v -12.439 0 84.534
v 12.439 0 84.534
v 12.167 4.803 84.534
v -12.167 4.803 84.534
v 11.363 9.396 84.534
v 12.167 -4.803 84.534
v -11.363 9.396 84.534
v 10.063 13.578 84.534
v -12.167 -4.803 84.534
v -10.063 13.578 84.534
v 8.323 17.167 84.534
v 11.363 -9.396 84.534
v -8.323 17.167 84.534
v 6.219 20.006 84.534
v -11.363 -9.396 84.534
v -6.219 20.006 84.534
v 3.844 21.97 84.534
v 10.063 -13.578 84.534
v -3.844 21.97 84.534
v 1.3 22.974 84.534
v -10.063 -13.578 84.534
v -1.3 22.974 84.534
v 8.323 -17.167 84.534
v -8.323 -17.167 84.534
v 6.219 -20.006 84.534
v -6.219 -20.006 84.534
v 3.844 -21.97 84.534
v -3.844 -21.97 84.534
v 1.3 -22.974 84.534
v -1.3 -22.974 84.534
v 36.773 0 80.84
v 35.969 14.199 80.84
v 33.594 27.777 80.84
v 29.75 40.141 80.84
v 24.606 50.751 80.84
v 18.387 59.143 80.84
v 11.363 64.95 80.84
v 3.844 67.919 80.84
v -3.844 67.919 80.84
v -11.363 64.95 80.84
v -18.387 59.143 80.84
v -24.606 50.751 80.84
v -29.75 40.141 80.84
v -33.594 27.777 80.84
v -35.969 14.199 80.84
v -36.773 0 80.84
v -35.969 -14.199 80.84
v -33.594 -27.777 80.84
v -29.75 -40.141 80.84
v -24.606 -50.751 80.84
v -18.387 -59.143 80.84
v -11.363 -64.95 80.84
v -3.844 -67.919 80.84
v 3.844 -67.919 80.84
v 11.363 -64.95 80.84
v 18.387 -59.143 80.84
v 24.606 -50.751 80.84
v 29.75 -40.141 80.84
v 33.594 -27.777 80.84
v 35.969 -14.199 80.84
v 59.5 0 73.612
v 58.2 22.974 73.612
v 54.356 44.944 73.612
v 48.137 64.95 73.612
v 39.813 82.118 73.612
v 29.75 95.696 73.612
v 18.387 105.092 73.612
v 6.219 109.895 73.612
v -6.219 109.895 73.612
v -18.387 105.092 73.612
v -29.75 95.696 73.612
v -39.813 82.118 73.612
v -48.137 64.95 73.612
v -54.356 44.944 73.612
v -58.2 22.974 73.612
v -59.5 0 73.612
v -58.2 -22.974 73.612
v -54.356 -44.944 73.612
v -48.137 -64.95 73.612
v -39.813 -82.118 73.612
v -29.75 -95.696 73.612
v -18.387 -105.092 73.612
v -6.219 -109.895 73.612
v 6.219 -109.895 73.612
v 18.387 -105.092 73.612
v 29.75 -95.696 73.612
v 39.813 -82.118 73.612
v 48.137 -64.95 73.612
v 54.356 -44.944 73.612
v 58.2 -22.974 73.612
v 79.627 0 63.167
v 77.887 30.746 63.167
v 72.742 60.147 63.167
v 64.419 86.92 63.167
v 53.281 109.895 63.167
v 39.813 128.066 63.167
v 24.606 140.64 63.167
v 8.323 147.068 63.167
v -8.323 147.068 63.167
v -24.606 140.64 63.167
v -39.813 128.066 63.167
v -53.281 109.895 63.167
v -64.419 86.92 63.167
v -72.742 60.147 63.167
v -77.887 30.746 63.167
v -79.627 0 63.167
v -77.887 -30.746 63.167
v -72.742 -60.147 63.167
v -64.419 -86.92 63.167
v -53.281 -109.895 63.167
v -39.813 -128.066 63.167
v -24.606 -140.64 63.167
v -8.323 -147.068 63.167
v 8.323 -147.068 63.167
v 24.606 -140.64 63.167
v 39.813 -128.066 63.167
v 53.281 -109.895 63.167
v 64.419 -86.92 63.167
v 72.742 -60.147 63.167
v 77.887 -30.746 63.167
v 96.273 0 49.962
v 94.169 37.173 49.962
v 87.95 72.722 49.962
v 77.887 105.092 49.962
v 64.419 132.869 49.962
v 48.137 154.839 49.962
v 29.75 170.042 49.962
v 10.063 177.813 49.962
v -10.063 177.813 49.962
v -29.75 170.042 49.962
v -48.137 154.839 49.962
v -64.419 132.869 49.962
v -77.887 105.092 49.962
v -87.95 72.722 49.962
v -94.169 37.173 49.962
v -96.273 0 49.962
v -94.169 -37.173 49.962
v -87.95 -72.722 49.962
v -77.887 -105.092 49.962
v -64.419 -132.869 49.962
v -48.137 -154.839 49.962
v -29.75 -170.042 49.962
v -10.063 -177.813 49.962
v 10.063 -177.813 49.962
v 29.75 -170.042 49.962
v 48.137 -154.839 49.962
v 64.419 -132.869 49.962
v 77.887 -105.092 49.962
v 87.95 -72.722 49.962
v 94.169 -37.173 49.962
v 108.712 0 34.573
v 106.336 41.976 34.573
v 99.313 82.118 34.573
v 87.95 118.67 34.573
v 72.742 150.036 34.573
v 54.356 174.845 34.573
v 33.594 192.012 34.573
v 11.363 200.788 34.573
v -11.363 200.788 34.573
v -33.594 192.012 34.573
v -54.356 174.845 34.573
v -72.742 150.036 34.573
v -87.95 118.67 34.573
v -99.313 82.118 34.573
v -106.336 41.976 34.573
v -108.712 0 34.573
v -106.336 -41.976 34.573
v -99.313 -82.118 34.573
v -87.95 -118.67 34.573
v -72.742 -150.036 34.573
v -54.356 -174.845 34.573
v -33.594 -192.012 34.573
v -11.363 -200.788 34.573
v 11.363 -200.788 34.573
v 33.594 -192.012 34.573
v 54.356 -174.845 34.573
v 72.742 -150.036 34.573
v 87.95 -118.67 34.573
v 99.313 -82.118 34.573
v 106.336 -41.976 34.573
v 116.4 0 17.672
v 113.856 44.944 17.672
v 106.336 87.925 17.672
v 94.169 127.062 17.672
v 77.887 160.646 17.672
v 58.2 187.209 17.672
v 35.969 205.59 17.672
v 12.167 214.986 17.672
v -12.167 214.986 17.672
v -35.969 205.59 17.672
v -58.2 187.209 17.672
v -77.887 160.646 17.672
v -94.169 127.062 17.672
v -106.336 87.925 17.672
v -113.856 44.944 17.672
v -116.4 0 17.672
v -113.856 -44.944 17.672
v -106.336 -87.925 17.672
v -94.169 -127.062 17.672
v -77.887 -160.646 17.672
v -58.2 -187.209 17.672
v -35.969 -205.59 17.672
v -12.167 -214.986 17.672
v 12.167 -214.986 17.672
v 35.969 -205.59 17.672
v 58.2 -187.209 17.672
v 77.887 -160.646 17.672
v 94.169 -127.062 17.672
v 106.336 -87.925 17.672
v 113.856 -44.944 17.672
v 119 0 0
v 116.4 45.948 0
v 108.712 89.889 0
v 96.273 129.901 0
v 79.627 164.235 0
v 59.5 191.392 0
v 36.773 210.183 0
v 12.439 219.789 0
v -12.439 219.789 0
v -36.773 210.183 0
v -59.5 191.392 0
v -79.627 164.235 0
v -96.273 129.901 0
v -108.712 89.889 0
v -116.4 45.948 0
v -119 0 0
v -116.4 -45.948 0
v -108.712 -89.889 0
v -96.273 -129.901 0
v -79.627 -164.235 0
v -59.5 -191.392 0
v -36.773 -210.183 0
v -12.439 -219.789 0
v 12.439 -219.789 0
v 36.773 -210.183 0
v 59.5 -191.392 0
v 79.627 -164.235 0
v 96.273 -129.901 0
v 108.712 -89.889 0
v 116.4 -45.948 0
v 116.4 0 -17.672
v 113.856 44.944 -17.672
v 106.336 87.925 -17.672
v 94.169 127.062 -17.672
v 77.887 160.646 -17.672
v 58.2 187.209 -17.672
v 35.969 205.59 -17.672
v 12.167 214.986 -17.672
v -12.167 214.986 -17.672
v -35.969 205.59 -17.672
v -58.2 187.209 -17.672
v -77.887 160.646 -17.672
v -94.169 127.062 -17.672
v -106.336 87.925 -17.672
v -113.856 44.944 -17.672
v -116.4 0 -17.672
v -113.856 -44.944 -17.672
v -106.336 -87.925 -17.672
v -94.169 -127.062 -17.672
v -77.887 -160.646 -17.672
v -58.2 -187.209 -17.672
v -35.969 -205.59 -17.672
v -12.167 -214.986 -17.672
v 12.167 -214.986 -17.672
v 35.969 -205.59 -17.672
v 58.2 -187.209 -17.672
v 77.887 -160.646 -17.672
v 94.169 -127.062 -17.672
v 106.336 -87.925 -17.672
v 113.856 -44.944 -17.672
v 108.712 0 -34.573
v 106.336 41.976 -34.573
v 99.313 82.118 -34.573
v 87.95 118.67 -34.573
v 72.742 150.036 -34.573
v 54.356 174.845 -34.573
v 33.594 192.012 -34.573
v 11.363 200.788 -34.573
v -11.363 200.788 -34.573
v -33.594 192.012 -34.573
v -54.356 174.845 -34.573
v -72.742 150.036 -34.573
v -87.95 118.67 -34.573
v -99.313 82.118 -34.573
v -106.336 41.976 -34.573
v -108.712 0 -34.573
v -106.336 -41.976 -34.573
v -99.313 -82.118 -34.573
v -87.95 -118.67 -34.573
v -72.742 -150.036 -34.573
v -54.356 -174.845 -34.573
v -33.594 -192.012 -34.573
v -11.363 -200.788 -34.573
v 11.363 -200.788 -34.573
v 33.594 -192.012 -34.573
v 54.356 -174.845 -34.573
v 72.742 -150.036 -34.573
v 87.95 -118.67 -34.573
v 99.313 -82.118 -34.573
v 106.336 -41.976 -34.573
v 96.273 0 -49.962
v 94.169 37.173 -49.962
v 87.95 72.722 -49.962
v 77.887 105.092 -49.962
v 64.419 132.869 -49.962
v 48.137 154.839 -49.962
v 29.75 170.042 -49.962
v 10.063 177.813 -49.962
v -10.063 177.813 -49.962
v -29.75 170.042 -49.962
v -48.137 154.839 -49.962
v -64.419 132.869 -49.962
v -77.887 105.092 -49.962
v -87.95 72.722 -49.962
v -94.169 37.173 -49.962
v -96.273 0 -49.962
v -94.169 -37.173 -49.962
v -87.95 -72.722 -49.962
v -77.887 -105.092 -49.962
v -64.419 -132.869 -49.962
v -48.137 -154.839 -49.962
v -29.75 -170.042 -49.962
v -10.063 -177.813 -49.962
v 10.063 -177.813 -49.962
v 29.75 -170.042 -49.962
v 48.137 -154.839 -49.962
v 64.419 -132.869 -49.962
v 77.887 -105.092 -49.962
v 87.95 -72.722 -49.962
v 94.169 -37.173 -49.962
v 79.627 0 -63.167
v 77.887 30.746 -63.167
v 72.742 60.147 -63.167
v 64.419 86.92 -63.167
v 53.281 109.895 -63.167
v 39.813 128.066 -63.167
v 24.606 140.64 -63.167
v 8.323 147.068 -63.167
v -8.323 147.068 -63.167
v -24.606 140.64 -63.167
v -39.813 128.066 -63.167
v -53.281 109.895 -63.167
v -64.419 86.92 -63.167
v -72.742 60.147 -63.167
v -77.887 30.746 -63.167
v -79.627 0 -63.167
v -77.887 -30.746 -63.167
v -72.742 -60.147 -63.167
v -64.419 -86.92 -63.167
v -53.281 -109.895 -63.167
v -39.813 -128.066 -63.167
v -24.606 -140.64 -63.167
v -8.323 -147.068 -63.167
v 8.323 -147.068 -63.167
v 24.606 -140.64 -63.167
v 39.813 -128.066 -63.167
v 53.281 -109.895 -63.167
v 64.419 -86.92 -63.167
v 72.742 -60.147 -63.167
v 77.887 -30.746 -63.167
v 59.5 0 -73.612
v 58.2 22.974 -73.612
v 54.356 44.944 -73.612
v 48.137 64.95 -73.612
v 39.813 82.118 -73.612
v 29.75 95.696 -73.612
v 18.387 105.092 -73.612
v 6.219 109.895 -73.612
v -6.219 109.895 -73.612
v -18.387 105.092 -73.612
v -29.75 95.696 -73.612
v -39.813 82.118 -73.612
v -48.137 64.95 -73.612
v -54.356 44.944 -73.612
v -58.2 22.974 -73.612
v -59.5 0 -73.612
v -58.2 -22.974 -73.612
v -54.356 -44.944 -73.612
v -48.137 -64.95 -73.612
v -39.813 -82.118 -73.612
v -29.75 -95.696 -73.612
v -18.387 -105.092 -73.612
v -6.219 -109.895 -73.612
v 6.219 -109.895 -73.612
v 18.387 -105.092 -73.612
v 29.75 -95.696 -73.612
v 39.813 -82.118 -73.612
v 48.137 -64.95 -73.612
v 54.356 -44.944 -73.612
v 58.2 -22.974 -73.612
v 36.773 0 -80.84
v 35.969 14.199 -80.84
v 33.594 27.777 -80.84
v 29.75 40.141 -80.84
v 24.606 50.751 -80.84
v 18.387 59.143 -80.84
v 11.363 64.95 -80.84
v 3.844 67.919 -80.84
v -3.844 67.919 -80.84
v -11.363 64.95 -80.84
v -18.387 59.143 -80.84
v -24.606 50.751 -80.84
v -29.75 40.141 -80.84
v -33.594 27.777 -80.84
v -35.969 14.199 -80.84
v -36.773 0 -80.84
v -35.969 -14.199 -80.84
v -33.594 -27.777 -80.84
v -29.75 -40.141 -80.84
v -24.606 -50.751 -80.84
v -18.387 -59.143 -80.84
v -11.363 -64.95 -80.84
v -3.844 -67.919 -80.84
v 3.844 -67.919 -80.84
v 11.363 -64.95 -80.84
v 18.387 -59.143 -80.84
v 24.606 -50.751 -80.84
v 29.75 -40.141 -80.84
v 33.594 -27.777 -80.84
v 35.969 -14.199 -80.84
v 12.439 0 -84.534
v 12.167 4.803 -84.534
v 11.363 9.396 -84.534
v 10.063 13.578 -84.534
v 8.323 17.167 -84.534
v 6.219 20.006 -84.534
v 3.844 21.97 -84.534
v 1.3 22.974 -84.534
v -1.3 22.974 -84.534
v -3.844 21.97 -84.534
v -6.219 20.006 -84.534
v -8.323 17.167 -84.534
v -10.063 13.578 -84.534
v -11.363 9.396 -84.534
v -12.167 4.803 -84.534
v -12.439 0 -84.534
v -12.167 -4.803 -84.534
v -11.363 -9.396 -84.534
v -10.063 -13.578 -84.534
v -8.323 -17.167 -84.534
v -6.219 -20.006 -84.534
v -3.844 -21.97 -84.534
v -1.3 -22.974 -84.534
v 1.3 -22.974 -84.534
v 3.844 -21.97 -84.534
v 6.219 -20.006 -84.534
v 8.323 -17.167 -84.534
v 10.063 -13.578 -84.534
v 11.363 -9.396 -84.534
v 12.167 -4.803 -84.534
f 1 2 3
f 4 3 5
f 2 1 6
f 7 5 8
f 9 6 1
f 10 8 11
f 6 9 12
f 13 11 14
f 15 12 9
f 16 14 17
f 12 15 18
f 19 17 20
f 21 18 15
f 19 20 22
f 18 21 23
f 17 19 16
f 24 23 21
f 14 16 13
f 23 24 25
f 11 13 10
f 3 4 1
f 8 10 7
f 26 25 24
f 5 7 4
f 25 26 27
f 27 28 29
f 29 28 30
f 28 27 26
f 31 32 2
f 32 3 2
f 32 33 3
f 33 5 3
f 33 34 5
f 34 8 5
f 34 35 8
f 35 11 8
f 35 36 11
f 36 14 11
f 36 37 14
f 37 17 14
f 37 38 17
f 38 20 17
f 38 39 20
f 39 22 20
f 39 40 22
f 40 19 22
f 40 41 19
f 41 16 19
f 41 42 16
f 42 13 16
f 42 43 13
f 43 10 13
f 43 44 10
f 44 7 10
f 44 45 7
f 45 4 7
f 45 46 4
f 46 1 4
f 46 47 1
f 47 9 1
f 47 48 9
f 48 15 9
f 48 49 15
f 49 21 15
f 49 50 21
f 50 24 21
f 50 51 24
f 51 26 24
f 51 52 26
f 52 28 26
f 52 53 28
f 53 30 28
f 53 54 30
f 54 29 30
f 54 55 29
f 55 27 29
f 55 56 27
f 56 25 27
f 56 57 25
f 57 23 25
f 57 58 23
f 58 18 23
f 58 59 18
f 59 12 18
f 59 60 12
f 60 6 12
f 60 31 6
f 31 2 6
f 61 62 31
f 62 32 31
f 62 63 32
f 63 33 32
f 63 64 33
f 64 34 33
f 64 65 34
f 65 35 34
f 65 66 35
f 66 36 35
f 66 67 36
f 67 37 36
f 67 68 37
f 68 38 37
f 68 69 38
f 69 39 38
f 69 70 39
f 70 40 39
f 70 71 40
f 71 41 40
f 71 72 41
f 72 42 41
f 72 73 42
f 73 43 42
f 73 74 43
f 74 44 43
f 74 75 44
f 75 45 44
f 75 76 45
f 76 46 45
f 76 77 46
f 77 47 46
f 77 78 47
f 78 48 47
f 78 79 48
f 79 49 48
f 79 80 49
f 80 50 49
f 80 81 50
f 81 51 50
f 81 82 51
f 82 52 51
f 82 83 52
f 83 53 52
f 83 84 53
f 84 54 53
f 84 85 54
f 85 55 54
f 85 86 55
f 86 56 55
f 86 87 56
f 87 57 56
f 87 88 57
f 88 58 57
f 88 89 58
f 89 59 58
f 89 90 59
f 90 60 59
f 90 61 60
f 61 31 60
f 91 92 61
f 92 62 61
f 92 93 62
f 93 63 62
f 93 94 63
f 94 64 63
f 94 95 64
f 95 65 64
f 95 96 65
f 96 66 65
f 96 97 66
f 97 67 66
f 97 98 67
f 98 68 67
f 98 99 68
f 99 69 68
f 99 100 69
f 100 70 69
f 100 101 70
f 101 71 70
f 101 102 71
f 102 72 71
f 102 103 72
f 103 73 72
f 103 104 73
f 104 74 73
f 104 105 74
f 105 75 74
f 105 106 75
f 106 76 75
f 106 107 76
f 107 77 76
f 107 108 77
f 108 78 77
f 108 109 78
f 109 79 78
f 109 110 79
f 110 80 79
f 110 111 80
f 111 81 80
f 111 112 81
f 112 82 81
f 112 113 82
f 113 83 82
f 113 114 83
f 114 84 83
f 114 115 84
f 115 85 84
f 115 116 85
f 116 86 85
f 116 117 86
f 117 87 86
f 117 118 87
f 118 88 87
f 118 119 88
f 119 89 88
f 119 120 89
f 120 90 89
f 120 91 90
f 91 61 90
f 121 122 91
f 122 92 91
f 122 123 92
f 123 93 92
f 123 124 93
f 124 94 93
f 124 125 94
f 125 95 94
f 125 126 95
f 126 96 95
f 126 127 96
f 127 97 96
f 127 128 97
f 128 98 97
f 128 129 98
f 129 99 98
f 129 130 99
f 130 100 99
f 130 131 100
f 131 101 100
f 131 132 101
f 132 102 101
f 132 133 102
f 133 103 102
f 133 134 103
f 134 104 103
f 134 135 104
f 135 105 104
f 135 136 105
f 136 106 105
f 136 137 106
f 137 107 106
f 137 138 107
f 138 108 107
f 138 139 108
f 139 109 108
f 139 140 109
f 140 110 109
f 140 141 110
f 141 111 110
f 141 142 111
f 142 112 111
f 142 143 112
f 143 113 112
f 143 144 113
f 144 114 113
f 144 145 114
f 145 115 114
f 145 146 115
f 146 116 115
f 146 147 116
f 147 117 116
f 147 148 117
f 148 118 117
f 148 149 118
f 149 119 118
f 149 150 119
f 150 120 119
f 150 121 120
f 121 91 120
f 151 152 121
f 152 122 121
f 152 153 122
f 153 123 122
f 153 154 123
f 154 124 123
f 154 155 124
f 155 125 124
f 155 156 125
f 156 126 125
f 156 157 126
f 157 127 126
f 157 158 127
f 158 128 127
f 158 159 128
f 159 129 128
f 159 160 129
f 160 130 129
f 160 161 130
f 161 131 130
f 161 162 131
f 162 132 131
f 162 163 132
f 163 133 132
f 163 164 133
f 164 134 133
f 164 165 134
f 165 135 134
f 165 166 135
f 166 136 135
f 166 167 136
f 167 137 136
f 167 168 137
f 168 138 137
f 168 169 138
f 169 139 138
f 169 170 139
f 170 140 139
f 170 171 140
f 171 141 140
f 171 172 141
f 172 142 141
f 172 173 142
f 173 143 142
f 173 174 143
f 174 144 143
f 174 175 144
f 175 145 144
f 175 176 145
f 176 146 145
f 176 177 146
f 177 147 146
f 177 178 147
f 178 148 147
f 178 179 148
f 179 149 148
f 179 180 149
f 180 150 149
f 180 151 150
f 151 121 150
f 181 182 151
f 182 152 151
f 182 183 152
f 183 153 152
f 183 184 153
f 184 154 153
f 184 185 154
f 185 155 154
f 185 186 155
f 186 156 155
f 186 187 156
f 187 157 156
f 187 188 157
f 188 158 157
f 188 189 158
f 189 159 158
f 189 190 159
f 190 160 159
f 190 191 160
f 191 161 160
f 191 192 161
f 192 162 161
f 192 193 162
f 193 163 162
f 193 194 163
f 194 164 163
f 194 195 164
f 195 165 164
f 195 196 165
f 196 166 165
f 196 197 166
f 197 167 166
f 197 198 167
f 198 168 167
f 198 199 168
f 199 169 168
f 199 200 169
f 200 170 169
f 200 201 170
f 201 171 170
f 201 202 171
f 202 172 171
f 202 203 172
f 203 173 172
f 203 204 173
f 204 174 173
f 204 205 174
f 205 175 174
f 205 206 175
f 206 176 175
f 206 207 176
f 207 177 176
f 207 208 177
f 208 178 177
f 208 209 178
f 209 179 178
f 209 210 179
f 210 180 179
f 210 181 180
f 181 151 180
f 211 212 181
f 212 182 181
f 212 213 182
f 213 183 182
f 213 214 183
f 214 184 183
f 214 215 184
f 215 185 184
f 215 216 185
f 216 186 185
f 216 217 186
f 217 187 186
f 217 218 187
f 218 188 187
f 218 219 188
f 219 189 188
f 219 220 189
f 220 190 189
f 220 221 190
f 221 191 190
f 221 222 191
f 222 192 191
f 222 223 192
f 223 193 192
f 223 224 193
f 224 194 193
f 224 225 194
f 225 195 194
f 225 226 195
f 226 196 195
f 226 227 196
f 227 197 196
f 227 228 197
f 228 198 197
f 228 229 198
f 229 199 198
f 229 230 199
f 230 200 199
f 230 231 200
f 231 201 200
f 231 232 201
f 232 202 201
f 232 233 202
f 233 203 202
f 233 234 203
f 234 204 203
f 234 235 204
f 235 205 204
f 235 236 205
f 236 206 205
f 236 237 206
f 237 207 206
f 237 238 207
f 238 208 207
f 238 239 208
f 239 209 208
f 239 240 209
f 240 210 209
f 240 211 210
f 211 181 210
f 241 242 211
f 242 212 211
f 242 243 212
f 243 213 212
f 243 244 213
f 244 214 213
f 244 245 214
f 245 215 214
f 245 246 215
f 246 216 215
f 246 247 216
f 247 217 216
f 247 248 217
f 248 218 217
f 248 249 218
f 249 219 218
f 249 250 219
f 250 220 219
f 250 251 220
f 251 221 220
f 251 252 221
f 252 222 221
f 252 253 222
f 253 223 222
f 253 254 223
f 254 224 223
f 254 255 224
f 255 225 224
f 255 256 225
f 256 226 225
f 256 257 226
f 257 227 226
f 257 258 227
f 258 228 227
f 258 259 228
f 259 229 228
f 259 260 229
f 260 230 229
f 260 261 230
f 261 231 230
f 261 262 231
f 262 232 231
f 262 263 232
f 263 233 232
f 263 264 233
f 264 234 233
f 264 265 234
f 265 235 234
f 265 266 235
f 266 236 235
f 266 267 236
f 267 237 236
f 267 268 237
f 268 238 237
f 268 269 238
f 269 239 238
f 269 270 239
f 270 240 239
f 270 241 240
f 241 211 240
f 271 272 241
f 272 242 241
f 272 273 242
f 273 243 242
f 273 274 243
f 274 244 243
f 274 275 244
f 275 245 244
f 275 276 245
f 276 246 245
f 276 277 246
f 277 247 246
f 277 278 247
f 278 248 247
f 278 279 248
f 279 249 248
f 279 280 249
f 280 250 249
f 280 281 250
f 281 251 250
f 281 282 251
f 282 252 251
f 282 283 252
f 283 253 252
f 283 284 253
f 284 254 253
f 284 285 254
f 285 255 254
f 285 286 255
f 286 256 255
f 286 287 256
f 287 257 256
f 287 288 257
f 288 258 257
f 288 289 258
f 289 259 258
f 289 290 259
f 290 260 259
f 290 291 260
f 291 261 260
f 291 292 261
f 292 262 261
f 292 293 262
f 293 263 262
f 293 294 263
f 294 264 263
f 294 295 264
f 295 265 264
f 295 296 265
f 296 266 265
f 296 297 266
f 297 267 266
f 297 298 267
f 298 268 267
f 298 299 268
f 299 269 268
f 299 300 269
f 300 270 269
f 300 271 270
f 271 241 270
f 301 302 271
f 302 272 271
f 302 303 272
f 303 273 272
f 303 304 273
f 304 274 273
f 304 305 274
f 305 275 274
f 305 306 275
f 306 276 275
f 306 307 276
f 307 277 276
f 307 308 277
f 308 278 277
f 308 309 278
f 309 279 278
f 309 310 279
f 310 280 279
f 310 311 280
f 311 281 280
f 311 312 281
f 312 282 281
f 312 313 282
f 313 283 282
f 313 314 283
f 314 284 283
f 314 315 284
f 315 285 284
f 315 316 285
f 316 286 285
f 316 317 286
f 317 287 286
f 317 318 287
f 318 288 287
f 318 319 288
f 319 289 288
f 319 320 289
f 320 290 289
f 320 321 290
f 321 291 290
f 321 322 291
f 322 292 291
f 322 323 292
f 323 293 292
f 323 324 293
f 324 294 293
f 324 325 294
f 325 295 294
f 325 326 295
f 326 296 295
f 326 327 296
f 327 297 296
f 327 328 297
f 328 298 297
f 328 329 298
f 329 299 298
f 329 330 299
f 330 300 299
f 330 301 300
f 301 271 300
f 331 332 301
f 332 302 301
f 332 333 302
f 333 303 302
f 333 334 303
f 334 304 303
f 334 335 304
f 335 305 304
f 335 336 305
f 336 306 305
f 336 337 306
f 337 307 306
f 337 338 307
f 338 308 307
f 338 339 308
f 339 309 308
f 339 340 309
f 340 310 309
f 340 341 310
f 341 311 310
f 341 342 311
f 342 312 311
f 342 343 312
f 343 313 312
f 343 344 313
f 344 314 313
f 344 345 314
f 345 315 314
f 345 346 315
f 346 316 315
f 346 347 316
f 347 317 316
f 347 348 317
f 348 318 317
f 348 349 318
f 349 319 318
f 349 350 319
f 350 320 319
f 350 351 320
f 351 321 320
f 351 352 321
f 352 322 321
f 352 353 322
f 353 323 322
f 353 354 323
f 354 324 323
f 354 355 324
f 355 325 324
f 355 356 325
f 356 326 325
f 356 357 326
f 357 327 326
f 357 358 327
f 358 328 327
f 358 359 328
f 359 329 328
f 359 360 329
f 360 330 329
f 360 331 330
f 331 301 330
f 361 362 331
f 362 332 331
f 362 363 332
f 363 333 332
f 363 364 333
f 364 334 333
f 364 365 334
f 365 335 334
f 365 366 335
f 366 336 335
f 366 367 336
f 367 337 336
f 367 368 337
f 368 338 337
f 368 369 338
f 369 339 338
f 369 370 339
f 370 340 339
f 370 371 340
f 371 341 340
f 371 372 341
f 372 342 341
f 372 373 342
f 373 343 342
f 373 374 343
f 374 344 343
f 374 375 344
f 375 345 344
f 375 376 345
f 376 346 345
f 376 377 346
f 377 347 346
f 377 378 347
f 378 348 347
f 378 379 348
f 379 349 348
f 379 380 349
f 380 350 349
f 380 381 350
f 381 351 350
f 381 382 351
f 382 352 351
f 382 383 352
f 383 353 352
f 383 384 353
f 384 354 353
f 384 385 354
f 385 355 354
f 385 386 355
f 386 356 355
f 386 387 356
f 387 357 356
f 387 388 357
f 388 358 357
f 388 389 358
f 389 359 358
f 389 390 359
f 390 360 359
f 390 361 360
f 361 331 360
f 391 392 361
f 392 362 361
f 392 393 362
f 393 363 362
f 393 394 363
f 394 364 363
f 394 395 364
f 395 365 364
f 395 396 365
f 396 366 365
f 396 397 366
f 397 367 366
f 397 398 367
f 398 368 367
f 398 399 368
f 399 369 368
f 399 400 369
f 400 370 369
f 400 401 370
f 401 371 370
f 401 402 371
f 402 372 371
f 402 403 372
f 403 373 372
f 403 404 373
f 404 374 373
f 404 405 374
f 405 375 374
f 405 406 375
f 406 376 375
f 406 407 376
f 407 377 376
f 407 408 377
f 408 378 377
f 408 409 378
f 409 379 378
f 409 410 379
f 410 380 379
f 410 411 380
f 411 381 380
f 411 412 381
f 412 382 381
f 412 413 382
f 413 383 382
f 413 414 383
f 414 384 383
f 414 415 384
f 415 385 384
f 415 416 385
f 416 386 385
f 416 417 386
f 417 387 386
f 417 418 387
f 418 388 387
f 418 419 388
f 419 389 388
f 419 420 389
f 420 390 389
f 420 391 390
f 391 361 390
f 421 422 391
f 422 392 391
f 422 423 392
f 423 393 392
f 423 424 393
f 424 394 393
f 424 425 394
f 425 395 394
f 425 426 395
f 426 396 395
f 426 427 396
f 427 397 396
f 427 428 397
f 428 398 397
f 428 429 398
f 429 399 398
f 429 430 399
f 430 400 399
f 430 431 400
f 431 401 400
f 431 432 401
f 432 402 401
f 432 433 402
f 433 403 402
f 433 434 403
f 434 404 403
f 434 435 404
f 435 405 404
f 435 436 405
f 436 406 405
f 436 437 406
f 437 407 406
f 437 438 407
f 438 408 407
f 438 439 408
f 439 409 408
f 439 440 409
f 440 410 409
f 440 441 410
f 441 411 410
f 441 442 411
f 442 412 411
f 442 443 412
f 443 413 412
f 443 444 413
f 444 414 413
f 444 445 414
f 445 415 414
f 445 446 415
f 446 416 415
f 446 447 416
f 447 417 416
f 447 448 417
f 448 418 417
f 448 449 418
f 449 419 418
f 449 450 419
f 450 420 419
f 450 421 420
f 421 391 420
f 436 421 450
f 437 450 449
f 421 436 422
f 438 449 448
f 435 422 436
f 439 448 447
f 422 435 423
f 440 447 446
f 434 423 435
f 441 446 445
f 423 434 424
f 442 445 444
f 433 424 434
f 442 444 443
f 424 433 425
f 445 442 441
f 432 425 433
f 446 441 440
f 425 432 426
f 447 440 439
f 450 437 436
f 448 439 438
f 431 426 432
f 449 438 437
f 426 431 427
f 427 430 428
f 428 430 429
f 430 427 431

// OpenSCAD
// Generated by SolidPython 1.0.1 on 2020-07-29 00:46:47


scale(v = [7, 13, 5]) {
	sphere(r = 17);
}
/***********************************************
*********      SolidPython code:      **********
************************************************
 
# import packages: SolidPython
from solid import *
from solid.utils import *
from itertools import chain, combinations, permutations


class Resize:

    def __init__(self, scad_file):
        self.scad_file = scad_file
        #self.scad_file = import_scad(scad_file)
        # cone/cylinder param:
        self.r1 = 0
        self.r2 = 0
        self.h = 0
        # rectangular prism param:
        self.w = 0
        self.l = 0
        # ellipse param:
        self.r = 0

    # import OpenScad code (file name corresponds to shape)


    # classify shape + parameters
    def assign(self, param1, param2, param3):
        if self.scad_file == 'cone.scad':
            self.r1 = param1
            self.r2 = param2
            self.h = param3
        elif self.scad_file == 'cylinder.scad':
            self.r1 = param1
            self.r2 = param2
            self.h = param3
        elif self.scad_file == 'rectangularPrism.scad':
            self.h = param1
            self.l = param2
            self.w = param3
        else:
            self.r = param1
            self.h = param2

    # resize parameters
    def iterate(self):
        x = range(3, 20, 2)
        i = 1
        if self.scad_file == 'cone.scad':
            tempList = list(permutations(x, 2))
            for temp in tempList:
                param1 = temp[0]
                param2 = temp[1]
                filepath = 'produced_scad_files/' + 'cone' + str(param1) + '_' + str(param2) + '_' + '.scad'
                scad_render_to_file(cylinder(h=param1, r1=param2, r2=0), filepath)

        elif self.scad_file == 'cylinder.scad':
            tempList = list(permutations(x, 3))
            for temp in tempList:
                param1 = temp[0]
                param2 = temp[1]
                filepath = 'produced_scad_files/' + 'cylinder' + str(param1) + '_' + str(param2) + '_' + '.scad'
                scad_render_to_file(cylinder(h=param1, r1=param2, r2=param2), filepath)

        elif self.scad_file == 'rectangularPrism.scad':
            tempList = list(permutations(x, 3))
            for temp in tempList:
                param1 = temp[0]
                param2 = temp[1]
                param3 = temp[2]
                filepath = 'produced_scad_files/' + 'rectangularPrism' + str(param1) + '_' + str(param2) + '_' + str(
                    param3) + '.scad'
                scad_render_to_file(cube(size=(param1, param2, param3)), filepath)

        elif self.scad_file == 'ellipse.scad':
            tempList = list(permutations(x, 4))
            for temp in tempList:
                param1 = temp[0]
                param2 = temp[1]
                param3 = temp[2]
                param4 = temp[3]
                filepath = 'produced_scad_files/' + 'ellipse' + str(param1) + '_' + str(param2) + '_' + str(param3) + '_' + str(param4) + '.scad'
                scad_render_to_file(scale([param1, param2, param3])(sphere(r=param4)), filepath)

    def render_to_scadfile(self):
        scad_render_to_file(scad, 'example.scad') 
 
************************************************/
